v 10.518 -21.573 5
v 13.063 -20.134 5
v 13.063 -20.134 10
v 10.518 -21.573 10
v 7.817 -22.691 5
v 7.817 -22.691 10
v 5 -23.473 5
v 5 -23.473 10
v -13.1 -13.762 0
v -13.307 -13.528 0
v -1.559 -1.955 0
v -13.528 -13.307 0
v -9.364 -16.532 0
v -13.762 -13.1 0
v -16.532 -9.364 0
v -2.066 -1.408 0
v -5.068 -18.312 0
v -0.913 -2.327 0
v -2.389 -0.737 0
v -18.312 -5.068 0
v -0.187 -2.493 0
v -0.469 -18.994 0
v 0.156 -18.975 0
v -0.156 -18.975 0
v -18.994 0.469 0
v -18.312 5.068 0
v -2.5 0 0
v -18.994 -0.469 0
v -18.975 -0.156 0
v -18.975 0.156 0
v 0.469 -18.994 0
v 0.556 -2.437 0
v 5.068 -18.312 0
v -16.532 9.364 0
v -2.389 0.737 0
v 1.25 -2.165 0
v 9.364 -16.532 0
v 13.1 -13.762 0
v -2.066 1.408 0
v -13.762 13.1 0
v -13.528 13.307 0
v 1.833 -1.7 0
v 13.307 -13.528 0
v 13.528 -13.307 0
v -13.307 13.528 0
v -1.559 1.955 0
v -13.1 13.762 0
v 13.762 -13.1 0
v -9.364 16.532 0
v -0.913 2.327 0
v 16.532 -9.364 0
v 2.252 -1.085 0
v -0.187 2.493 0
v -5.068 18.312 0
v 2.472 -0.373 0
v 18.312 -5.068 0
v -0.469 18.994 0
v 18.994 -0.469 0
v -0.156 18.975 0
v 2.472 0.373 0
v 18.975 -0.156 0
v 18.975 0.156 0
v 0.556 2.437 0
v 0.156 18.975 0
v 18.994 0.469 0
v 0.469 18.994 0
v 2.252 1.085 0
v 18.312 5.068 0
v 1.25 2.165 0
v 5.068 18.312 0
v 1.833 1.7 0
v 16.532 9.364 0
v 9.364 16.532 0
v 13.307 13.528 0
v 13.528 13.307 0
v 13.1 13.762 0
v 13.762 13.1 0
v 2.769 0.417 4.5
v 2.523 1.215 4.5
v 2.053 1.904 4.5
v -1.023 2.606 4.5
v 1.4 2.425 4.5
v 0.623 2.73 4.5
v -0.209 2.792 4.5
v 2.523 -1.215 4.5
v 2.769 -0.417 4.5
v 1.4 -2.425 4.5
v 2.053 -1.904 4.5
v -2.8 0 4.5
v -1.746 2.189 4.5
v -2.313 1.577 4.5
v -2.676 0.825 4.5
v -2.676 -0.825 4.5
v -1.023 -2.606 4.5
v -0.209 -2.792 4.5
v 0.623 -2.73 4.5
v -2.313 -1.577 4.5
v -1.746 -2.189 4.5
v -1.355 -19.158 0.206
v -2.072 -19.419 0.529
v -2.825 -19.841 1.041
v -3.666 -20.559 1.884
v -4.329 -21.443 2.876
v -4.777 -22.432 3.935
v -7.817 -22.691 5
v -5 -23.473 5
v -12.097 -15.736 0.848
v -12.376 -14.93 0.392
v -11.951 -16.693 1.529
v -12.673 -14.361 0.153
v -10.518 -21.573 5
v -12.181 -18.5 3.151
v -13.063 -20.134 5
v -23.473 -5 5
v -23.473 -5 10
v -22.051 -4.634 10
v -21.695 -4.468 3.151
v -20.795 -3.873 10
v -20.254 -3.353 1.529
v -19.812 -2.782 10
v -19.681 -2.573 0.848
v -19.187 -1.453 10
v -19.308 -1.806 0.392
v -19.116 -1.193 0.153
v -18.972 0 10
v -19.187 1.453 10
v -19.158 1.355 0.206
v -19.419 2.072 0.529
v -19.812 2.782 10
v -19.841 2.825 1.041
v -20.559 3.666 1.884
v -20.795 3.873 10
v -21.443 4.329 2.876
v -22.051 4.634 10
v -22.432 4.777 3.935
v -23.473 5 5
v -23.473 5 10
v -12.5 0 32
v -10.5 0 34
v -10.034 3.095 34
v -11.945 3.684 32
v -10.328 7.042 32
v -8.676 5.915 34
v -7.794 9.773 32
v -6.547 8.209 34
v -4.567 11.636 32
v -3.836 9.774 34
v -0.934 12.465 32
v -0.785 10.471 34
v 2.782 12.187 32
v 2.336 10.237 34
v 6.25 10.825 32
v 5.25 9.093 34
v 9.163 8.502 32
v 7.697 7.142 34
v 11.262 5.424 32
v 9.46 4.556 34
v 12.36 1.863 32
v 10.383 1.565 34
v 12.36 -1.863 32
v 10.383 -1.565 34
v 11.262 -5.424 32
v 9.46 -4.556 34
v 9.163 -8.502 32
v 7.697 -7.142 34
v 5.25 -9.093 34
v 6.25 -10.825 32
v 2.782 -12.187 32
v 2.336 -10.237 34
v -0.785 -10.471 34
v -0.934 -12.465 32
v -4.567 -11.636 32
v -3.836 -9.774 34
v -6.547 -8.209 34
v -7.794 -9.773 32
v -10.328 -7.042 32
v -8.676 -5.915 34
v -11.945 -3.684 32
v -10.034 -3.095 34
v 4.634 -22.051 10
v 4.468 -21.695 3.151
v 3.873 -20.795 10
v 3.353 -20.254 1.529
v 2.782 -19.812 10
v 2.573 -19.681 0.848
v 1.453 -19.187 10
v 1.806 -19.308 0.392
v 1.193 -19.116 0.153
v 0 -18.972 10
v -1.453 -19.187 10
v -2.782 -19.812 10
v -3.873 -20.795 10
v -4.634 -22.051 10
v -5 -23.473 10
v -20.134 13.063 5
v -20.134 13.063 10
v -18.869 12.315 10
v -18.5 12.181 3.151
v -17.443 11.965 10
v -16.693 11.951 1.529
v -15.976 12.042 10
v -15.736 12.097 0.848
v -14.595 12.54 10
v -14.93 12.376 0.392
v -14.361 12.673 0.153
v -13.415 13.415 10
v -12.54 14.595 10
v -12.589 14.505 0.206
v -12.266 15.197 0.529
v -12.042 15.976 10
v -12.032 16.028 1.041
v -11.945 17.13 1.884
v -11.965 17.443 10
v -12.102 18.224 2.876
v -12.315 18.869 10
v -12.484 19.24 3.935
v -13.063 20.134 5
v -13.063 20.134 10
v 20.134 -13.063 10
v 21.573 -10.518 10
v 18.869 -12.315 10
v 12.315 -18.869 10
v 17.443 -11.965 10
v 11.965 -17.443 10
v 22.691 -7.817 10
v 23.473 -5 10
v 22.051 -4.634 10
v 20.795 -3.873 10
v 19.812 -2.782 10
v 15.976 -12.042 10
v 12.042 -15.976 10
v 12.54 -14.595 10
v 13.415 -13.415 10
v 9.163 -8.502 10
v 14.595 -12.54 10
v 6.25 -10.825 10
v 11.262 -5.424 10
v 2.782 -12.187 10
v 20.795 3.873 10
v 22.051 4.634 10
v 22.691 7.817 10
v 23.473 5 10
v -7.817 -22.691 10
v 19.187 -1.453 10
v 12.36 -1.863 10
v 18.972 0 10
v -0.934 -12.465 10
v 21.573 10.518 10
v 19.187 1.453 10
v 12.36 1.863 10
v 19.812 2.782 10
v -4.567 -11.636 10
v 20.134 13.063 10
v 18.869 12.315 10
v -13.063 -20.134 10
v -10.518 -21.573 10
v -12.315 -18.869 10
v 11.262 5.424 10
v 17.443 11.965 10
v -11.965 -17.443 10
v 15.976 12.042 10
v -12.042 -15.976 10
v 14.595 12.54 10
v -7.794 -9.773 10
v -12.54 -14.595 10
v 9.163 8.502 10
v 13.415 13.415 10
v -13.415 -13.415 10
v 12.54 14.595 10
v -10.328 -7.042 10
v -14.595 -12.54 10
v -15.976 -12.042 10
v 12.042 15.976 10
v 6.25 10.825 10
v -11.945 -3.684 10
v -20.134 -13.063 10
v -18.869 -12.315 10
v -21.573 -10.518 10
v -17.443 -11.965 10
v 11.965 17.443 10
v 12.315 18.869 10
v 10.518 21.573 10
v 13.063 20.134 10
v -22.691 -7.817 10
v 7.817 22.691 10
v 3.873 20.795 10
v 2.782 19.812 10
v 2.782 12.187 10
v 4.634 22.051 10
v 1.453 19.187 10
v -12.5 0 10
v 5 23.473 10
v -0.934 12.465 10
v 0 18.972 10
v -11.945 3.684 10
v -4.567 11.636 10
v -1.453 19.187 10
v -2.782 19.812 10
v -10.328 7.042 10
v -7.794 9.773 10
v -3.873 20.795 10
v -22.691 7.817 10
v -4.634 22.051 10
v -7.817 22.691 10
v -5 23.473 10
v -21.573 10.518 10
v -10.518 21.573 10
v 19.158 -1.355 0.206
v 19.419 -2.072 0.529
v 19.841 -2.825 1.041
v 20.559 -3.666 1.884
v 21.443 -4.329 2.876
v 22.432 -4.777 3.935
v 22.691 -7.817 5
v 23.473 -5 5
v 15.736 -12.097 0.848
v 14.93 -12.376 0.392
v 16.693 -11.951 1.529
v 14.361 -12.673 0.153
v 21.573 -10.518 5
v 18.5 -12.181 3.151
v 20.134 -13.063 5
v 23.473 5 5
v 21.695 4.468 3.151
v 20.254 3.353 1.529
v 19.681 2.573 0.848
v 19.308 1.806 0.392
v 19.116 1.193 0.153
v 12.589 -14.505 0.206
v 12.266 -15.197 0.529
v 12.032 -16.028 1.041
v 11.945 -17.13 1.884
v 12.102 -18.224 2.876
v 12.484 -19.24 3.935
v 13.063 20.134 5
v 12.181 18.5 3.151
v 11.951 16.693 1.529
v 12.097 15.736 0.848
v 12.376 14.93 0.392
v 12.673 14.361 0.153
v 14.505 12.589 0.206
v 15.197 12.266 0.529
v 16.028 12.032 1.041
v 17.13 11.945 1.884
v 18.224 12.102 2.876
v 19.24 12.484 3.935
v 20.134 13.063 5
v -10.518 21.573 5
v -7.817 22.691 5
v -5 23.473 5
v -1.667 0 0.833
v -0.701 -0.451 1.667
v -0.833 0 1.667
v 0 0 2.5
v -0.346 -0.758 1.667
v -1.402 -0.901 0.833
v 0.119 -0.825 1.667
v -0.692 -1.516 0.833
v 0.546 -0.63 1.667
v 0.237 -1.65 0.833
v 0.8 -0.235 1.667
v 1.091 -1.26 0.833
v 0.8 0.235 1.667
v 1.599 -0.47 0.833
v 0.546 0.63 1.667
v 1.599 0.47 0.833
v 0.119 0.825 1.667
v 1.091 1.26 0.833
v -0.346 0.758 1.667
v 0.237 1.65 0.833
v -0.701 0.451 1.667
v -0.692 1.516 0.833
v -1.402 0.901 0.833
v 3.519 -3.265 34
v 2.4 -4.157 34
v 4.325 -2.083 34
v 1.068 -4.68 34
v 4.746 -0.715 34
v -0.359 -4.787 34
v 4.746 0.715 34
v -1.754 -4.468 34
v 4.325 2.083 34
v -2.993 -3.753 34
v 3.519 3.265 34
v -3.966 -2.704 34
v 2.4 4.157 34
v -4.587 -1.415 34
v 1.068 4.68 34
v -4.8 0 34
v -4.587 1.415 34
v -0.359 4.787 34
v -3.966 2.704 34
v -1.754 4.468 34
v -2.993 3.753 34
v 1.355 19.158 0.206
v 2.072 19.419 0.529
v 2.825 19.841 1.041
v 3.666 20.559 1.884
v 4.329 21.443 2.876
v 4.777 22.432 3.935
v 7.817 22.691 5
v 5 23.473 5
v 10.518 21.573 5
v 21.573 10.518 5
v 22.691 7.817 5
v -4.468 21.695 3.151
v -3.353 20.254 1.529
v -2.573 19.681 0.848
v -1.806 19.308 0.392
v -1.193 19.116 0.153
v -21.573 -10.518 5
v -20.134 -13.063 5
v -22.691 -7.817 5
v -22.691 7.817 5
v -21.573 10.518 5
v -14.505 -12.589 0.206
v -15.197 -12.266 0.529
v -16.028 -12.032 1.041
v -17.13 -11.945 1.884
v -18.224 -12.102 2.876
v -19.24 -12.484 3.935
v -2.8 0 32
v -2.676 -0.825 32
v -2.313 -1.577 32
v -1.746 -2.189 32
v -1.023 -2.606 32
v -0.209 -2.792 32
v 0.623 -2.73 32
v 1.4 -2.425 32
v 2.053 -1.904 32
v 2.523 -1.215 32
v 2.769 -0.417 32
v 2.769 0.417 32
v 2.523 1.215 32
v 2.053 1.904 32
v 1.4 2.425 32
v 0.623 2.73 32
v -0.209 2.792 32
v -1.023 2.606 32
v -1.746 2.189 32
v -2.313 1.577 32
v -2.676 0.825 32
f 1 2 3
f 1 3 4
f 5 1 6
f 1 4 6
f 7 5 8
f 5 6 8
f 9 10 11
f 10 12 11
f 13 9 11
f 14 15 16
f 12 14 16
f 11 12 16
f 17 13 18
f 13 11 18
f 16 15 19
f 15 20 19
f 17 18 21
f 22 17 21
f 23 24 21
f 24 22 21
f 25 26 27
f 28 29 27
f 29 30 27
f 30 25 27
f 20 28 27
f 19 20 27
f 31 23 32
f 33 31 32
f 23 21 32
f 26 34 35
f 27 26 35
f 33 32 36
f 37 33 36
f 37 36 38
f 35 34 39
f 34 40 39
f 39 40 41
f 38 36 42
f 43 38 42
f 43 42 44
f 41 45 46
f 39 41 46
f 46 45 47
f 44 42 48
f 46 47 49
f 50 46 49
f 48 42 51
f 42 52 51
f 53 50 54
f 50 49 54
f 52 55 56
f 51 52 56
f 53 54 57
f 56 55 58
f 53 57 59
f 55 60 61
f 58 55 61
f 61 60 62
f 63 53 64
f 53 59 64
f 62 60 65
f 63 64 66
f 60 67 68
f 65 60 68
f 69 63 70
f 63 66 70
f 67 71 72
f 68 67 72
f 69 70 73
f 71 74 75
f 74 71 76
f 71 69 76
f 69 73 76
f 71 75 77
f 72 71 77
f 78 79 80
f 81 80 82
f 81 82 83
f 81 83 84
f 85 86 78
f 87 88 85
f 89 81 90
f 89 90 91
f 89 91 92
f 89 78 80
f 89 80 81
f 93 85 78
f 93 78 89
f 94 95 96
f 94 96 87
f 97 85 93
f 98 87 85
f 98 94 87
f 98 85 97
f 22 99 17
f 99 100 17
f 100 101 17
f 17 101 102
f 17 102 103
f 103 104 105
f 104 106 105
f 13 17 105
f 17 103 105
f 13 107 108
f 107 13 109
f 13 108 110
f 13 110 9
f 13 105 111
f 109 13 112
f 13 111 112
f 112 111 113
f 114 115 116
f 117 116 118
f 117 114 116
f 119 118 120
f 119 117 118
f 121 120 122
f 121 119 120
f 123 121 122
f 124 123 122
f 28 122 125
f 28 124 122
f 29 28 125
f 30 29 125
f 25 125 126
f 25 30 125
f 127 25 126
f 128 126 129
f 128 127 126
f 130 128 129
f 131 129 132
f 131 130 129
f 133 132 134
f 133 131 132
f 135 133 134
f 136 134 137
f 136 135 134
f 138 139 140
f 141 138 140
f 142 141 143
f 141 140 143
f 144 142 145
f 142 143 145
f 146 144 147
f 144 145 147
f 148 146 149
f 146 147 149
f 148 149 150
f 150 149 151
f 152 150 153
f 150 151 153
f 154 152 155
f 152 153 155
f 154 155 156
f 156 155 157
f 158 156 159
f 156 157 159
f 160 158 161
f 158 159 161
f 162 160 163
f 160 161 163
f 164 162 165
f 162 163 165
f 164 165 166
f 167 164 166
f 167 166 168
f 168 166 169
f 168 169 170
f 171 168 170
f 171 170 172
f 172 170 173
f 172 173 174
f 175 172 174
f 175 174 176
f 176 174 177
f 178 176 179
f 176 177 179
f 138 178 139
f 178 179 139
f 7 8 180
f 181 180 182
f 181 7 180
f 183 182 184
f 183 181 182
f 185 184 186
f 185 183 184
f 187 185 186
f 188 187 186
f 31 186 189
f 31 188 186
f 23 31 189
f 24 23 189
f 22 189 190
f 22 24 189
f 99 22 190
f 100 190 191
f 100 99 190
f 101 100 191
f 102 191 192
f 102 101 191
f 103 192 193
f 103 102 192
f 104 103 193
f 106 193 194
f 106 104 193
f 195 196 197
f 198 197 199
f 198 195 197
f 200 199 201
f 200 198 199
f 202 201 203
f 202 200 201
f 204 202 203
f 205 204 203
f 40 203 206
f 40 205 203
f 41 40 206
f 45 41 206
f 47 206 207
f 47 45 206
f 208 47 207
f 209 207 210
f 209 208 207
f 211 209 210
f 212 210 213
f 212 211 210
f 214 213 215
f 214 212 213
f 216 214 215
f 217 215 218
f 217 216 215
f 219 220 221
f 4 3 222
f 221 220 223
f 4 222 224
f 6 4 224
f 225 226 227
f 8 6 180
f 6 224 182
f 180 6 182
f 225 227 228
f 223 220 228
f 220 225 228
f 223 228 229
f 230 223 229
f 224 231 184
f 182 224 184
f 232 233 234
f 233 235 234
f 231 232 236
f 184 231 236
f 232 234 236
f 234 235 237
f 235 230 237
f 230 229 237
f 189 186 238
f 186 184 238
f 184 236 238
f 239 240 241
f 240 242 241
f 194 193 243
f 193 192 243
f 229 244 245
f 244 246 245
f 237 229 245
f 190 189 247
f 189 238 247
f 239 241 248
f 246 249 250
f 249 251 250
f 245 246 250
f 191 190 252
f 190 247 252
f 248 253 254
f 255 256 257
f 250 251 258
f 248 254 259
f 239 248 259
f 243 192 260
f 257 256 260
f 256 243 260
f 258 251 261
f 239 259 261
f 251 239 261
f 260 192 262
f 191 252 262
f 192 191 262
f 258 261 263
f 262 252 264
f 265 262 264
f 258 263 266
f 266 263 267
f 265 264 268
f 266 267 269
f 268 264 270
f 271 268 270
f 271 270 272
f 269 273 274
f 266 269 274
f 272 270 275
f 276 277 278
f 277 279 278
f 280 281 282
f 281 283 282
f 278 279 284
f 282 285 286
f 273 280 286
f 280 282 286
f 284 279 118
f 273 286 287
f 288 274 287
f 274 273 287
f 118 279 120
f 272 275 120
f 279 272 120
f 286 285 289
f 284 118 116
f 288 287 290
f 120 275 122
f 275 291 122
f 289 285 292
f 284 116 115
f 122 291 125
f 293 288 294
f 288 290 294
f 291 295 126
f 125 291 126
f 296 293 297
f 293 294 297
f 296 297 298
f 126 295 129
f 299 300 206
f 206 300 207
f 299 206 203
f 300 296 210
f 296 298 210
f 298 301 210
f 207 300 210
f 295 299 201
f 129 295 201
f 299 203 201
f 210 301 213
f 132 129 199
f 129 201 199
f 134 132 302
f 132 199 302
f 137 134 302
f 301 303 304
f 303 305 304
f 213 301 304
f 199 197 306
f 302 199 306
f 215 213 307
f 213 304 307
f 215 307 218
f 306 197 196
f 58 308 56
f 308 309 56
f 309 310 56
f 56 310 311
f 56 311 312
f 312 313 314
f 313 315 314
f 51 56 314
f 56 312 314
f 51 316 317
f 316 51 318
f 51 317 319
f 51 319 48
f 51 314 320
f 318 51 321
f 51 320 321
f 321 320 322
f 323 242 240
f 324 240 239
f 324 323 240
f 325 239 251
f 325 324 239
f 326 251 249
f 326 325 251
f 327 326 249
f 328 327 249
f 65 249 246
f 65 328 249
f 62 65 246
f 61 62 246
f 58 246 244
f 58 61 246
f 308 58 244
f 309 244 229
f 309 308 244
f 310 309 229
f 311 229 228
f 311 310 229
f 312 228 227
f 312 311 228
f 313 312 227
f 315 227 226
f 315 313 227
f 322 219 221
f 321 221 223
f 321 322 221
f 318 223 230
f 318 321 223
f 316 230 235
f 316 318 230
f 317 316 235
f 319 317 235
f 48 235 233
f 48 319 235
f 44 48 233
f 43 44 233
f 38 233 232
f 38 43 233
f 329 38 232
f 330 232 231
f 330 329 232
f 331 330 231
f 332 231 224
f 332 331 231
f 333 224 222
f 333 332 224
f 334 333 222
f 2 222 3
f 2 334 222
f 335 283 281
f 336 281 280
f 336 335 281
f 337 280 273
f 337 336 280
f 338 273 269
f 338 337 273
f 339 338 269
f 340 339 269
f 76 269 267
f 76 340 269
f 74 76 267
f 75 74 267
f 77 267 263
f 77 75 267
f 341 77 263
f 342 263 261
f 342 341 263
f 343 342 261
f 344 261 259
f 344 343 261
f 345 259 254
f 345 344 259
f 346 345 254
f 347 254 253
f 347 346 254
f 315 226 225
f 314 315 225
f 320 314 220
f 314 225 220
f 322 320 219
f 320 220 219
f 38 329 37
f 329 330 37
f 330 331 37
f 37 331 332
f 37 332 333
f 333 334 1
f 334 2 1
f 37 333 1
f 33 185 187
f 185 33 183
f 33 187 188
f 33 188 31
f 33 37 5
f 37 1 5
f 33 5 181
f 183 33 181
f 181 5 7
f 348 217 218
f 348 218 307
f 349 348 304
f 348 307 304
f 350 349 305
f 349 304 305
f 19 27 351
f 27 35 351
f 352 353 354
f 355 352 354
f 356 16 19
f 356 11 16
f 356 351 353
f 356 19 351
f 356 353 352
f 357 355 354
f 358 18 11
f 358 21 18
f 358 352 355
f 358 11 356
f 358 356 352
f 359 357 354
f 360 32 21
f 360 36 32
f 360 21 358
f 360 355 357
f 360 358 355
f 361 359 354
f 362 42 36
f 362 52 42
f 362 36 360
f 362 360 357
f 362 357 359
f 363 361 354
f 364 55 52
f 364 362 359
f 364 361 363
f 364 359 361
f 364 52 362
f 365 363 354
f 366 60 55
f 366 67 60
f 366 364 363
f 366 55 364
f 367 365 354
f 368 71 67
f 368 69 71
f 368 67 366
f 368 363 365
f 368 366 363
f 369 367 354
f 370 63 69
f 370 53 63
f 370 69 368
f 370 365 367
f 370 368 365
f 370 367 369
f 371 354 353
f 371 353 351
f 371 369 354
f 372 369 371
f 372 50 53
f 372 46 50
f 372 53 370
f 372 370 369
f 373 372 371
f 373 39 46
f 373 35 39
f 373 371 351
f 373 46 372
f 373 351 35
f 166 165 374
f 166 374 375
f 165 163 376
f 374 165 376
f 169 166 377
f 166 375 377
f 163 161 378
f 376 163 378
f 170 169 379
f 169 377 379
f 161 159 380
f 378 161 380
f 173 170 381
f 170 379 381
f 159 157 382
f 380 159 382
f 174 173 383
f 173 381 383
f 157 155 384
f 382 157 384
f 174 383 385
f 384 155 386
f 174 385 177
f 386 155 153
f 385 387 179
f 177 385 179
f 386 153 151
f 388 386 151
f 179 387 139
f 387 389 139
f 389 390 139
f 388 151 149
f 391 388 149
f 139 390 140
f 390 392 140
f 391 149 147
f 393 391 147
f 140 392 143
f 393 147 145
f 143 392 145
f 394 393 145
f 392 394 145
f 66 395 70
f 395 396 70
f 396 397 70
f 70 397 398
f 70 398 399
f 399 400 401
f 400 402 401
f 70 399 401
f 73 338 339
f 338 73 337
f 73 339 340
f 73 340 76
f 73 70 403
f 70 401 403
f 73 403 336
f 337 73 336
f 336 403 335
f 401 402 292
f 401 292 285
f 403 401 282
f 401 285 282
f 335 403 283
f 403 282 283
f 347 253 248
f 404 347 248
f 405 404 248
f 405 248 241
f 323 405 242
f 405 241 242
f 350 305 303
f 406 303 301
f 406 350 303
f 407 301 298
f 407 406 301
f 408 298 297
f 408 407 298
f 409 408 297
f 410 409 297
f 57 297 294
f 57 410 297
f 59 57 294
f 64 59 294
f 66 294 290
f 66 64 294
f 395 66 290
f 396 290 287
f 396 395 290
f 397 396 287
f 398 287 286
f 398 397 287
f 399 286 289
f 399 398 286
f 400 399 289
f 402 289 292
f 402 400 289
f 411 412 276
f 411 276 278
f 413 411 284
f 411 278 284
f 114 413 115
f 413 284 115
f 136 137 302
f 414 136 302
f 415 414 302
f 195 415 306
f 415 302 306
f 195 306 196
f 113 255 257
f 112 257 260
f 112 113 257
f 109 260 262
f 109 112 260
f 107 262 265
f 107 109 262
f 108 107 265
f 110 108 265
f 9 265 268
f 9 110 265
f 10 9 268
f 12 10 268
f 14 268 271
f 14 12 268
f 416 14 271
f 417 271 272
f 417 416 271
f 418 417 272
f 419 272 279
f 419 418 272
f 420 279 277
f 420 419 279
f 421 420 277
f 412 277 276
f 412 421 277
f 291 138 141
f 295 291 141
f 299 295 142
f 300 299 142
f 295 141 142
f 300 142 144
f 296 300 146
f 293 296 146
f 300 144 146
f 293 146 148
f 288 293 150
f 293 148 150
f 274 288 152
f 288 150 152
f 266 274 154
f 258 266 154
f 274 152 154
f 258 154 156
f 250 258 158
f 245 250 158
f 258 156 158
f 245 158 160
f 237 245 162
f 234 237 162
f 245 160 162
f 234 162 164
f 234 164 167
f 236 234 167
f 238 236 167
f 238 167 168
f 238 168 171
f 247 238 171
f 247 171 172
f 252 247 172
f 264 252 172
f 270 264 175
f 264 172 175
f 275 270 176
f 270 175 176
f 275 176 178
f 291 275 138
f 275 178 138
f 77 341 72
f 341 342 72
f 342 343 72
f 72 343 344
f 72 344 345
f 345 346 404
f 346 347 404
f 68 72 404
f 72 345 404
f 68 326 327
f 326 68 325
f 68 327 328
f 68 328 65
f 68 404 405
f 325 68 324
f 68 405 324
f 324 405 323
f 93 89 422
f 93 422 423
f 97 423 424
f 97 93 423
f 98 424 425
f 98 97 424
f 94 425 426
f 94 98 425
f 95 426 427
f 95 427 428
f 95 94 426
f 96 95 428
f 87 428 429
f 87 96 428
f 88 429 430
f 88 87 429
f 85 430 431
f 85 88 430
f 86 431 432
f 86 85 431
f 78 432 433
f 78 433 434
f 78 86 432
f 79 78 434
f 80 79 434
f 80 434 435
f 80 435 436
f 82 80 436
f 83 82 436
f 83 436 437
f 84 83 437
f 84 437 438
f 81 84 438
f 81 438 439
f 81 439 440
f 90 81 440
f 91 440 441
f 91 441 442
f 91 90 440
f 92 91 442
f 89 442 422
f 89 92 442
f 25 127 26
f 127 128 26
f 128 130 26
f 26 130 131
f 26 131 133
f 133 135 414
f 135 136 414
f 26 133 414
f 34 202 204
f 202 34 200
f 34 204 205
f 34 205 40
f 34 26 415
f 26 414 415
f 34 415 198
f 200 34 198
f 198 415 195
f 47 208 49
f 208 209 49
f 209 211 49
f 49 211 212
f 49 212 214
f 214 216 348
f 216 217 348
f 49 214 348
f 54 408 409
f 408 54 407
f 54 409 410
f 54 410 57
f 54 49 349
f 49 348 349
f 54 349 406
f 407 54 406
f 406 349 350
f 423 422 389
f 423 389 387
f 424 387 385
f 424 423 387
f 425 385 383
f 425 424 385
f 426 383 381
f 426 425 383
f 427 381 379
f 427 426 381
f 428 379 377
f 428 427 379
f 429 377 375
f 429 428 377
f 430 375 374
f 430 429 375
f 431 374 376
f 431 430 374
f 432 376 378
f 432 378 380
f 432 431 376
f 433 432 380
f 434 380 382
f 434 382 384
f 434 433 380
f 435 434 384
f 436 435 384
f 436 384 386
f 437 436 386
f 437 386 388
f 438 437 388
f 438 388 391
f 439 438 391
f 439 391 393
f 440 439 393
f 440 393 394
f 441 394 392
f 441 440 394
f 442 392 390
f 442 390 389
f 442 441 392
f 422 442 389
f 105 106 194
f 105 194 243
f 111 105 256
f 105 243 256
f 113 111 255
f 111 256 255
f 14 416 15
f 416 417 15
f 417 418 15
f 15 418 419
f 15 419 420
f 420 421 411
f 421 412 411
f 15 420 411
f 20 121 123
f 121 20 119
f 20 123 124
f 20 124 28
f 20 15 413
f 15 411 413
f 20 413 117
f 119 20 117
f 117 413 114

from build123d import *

# Parameters (mm, degrees)
SCHNITT_LINEAR_AUSTRAGEN1_DEPTH = 49.041648598
KREISMUSTER1_COUNT              = 8
SKIZZE3_W                       = 2.8
SKIZZE3_H                       = 29.5
FASE1_SIZE                      = 2


with BuildPart() as part:
    # Skizze1 → Rotation1 (revolve)
    with BuildSketch(Plane(origin=(0, 0, 0), x_dir=(1, 0, 0), z_dir=(0, 1, 0))):
        Polygon((0, 0), (-19, 0), (-24, -5), (-24, -10), (-12.5, -10), (-12.5, -34), (0, -34), align=None)
    revolve(axis=Axis((0, 0, 34), (0, 0, -1)))

    # Skizze2 → Schnitt-Linear austragen1 (cut, through all)
    with BuildSketch(Plane.XY):
        with BuildLine():
            ThreePointArc((-5, 23.473389189), (0, 18.972344588), (5, 23.473389189))
            ThreePointArc((5, 23.473389189), (0, 24), (-5, 23.473389189))
        make_face()
    schnitt_linear_austragen1 = extrude(amount=SCHNITT_LINEAR_AUSTRAGEN1_DEPTH, mode=Mode.SUBTRACT)

    # Kreismuster1: Schnitt-Linear austragen1 ×8 about axis
    kreismuster1_axis = Axis((0, 0, -88.99), (0, 0, 1))
    for i in range(1, KREISMUSTER1_COUNT):
        add(schnitt_linear_austragen1.rotate(kreismuster1_axis, i * 360 / KREISMUSTER1_COUNT), mode=Mode.SUBTRACT)

    # Skizze3 → Schnitt-Rotation1 (revolve, cut)
    with BuildSketch(Plane(origin=(0, 0, 0), x_dir=(1, 0, 0), z_dir=(0, 1, 0))):
        Polygon((0, 0), (0, -2.5), (-2.5, 0), align=None)
        with Locations((-1.4, -19.25)):
            Rectangle(SKIZZE3_W, SKIZZE3_H)
    revolve(axis=Axis((0, 0, 0), (0, 0, 1)), mode=Mode.SUBTRACT)

    # Fase1
    fase1_edges = [part.edges().sort_by_distance(p)[0] for p in [
        (12.5, 0, 34),
        (2.8, 0, 34),
    ]]
    chamfer(fase1_edges, length=FASE1_SIZE)


solid = part.part
